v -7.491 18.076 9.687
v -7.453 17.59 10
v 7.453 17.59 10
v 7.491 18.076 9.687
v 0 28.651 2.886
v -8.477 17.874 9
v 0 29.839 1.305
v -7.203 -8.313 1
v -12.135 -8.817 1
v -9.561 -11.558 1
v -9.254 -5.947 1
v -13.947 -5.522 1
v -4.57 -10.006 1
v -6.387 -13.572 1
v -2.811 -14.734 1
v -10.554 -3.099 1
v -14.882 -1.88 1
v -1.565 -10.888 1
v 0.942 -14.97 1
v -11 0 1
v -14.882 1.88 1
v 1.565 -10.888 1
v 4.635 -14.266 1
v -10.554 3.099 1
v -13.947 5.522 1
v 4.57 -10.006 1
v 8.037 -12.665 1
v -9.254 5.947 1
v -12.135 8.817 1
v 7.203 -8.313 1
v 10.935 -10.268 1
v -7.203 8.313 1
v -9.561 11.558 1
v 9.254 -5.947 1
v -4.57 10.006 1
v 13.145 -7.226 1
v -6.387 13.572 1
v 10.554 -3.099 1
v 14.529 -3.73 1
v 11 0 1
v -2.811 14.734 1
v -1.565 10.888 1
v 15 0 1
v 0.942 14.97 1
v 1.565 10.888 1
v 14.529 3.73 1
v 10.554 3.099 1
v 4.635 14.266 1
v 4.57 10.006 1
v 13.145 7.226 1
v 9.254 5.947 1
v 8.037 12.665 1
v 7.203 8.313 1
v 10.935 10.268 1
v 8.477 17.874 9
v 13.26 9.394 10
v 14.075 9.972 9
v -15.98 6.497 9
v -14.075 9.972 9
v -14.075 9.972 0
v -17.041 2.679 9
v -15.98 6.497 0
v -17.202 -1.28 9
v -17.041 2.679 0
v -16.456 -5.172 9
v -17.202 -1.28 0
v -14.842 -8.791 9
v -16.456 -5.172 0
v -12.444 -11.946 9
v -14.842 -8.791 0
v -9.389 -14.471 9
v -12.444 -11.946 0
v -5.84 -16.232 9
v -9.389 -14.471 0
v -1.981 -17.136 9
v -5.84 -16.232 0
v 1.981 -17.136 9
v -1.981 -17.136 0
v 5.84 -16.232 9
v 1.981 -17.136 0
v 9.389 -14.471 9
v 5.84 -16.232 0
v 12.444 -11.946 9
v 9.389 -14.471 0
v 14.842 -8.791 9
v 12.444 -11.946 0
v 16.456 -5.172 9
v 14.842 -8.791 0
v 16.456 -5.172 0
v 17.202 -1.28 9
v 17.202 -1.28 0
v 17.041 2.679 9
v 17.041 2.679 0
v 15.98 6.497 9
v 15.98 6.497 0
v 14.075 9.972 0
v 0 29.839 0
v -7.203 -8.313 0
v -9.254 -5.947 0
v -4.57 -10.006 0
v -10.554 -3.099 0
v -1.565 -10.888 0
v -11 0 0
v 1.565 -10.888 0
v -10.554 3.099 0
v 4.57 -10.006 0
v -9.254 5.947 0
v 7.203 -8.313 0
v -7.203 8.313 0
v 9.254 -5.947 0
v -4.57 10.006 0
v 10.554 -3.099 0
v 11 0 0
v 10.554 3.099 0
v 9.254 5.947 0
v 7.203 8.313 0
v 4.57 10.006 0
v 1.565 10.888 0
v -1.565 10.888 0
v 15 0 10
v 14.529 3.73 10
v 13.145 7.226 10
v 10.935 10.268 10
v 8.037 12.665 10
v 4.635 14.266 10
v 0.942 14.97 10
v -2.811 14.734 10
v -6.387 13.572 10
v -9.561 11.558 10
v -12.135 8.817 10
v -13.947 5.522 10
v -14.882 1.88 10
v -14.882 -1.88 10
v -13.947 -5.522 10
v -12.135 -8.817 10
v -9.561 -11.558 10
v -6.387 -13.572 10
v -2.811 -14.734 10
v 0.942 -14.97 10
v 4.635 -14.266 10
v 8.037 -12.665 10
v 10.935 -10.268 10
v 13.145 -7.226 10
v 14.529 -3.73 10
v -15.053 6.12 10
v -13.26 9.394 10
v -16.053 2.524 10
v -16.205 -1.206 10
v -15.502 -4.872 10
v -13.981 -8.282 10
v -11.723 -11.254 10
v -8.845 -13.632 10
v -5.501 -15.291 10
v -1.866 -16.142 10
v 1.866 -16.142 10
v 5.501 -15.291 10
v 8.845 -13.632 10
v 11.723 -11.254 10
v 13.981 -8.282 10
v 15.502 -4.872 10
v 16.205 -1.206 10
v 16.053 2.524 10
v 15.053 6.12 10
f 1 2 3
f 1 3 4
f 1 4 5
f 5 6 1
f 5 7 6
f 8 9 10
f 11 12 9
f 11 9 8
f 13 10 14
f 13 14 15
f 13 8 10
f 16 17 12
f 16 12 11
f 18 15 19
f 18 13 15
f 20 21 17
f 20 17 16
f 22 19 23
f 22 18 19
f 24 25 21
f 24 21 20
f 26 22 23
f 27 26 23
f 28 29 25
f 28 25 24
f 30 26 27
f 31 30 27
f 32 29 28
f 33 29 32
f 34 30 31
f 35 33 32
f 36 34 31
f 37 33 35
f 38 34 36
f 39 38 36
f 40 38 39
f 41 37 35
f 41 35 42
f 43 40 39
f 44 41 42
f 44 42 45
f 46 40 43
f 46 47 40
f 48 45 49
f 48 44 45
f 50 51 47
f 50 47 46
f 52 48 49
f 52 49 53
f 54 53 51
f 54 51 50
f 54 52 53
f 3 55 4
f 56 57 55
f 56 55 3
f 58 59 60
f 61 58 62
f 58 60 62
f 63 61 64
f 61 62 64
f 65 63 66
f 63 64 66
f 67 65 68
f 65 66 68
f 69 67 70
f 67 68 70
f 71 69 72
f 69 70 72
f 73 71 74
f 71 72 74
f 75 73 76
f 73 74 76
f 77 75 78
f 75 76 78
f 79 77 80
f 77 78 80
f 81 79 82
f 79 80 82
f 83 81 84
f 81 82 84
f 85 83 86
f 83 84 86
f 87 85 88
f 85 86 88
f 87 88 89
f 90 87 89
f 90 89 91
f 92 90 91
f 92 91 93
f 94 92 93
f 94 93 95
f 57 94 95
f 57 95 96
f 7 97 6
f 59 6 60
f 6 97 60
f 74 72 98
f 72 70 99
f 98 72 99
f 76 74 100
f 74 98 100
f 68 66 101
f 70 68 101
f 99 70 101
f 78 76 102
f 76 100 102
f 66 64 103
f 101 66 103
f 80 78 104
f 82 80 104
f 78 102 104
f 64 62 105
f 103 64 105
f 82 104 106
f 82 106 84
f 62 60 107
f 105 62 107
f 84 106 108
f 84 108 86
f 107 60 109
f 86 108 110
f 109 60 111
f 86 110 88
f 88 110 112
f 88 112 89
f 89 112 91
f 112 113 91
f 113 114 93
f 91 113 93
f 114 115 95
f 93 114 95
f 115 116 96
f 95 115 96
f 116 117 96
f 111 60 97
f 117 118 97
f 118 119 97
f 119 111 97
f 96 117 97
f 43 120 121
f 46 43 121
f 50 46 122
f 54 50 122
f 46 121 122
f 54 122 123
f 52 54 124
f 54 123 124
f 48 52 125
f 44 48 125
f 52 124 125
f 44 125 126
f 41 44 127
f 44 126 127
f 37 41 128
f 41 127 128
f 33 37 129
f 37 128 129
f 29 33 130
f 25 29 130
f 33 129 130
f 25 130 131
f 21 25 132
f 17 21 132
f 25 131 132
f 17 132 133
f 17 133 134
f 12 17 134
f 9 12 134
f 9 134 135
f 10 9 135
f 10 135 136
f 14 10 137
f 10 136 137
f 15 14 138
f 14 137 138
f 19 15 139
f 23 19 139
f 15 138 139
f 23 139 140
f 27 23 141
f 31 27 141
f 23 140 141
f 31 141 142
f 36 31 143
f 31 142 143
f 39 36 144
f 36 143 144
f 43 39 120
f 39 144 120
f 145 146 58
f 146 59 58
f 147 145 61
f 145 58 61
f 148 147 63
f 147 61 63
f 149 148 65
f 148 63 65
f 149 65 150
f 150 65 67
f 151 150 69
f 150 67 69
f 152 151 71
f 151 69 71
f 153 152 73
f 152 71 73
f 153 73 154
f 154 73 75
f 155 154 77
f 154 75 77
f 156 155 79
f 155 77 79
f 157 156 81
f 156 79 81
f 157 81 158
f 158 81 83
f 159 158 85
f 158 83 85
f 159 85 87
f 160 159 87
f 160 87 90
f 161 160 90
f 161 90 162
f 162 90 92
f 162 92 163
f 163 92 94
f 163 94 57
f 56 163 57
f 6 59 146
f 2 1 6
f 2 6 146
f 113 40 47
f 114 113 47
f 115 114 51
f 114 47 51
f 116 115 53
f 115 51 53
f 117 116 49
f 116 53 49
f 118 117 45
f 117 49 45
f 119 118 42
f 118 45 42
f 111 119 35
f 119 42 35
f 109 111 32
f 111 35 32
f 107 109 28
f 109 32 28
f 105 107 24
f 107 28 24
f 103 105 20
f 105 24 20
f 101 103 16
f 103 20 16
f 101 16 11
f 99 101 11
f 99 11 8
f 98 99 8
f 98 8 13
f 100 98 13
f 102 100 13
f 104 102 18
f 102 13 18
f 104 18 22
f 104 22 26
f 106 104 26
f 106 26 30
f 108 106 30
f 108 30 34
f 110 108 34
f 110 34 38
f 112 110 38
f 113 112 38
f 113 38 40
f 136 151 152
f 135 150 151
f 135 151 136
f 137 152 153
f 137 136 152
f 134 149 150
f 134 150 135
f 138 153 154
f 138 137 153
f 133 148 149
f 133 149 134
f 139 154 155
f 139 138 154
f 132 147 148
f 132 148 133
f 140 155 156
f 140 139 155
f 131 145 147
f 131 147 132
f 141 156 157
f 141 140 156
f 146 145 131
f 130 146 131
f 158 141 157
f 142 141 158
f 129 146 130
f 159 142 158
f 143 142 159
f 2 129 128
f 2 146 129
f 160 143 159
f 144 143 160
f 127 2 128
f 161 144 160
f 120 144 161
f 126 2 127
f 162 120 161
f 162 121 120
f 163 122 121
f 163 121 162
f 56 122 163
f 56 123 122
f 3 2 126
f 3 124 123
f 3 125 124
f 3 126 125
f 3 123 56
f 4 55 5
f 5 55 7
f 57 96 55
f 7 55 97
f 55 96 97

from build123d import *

# Parameters (mm, degrees)
F0_R         = 14.75
F0_R_2       = 11
F1_DEPTH     = 0.5
F3_DEPTH     = 10
F4_R         = 15
F5_DEPTH     = 9
F8_DEPTH     = 12.5
F9_T1_DEPTH  = 11.9079151816
F9_T3_DEPTH  = 20.7352111954
F9_T5_DEPTH  = 20.7352111954
F9_T7_DEPTH  = 11.9079151816
F9_T10_ANGLE = 250.6333606171
F6_R         = 11
F10_DEPTH    = 25


# Not quite as in the source:
# - a fillet or chamfer that OpenCascade refuses, or shapes differently, is made with other operations: its cross-section is extruded or revolved along the edge and cut away or added


with BuildPart() as f1:
    # F0 (on Top) → F1 (new body)
    with BuildSketch(Plane.XY):
        Circle(F0_R)
        Circle(F0_R_2, mode=Mode.SUBTRACT)
    extrude(amount=F1_DEPTH)

    # F2 (on Top) → F3 (join)
    with BuildSketch(Plane.XY):
        with BuildLine():
            Line((0, 29.8393759876), (-14.0754708725, 9.972142183))
            ThreePointArc((-14.0754708725, 9.972142183), (0, -17.25), (14.0754708725, 9.972142183))
            Line((14.0754708725, 9.972142183), (0, 29.8393759876))
        make_face()
    extrude(amount=F3_DEPTH)

    # F4 (on face) → F5 (cut)
    with BuildSketch(Plane.XY.offset(10)):
        Circle(F4_R)
    extrude(amount=-F5_DEPTH, mode=Mode.SUBTRACT)

    # F7 (on Right) → F8 (cut, symmetric)
    with BuildSketch(Plane.YZ):
        Polygon((30.5235402449, 1.681677395), (30.5303540081, 10.6816748157), (16.5303540081, 10.6816748157), align=None)
    extrude(amount=F8_DEPTH, both=True, mode=Mode.SUBTRACT)

    # F9: chamfer of 1 on 5 edges, made by hand

    # F9_s2 → F9_t1 (cut)
    with BuildSketch(Plane(origin=(0, 0, 0), x_dir=(0, 0, 1), z_dir=(-0.578095199, 0.8159693259, 0))):
        Polygon((9, 17.25), (10, 16.25), (10, 17.25), align=None)
    extrude(amount=F9_T1_DEPTH, mode=Mode.SUBTRACT)

    # F9_s4 → F9_t3 (cut)
    with BuildSketch(Plane(origin=(-11.4991327342, 16.2307862132, -10.4391545701), x_dir=(0.8159693259, 0.578095199, 0), z_dir=(0.5118849348, -0.7225149178, 0.4646999108))):
        Polygon((17.25, 12.4696557739), (16.5627169892, 13.4195021219), (17.25, 13.1932286048), align=None)
    extrude(amount=F9_T3_DEPTH, mode=Mode.SUBTRACT)

    # F9_s6 → F9_t5 (cut)
    with BuildSketch(Plane(origin=(0.8850905039, 1.2492868011, -0.8035037766), x_dir=(-0.8159693259, 0.578095199, 0), z_dir=(0.5118849348, 0.7225149178, -0.4646999108))):
        Polygon((17.25, 12.4696557739), (16.5627169892, 13.4195021219), (17.25, 13.1932286048), align=None)
    extrude(amount=F9_T5_DEPTH, mode=Mode.SUBTRACT)

    # F9_s8 → F9_t7 (cut)
    with BuildSketch(Plane(origin=(6.8839085967, 9.7164935241, 0), x_dir=(0, 0, 1), z_dir=(-0.578095199, -0.8159693259, 0))):
        Polygon((9, 17.25), (10, 16.25), (10, 17.25), align=None)
    extrude(amount=F9_T7_DEPTH, mode=Mode.SUBTRACT)

    # F9_s9 → F9_t10 (revolve, cut)
    with BuildSketch(Plane(origin=(0, 0, 0), x_dir=(0, 0, 1), z_dir=(0.578095199, 0.8159693259, 0))):
        Polygon((10, -16.25), (9, -17.25), (10, -17.25), align=None)
    revolve(axis=Axis((0, 0, 10), (0, 0, 1)), revolution_arc=F9_T10_ANGLE, mode=Mode.SUBTRACT)

    # F6 (on face) → F10 (cut)
    with BuildSketch(Plane.XY.offset(1)):
        Circle(F6_R)
    extrude(amount=-F10_DEPTH, mode=Mode.SUBTRACT)


solid = f1.part
